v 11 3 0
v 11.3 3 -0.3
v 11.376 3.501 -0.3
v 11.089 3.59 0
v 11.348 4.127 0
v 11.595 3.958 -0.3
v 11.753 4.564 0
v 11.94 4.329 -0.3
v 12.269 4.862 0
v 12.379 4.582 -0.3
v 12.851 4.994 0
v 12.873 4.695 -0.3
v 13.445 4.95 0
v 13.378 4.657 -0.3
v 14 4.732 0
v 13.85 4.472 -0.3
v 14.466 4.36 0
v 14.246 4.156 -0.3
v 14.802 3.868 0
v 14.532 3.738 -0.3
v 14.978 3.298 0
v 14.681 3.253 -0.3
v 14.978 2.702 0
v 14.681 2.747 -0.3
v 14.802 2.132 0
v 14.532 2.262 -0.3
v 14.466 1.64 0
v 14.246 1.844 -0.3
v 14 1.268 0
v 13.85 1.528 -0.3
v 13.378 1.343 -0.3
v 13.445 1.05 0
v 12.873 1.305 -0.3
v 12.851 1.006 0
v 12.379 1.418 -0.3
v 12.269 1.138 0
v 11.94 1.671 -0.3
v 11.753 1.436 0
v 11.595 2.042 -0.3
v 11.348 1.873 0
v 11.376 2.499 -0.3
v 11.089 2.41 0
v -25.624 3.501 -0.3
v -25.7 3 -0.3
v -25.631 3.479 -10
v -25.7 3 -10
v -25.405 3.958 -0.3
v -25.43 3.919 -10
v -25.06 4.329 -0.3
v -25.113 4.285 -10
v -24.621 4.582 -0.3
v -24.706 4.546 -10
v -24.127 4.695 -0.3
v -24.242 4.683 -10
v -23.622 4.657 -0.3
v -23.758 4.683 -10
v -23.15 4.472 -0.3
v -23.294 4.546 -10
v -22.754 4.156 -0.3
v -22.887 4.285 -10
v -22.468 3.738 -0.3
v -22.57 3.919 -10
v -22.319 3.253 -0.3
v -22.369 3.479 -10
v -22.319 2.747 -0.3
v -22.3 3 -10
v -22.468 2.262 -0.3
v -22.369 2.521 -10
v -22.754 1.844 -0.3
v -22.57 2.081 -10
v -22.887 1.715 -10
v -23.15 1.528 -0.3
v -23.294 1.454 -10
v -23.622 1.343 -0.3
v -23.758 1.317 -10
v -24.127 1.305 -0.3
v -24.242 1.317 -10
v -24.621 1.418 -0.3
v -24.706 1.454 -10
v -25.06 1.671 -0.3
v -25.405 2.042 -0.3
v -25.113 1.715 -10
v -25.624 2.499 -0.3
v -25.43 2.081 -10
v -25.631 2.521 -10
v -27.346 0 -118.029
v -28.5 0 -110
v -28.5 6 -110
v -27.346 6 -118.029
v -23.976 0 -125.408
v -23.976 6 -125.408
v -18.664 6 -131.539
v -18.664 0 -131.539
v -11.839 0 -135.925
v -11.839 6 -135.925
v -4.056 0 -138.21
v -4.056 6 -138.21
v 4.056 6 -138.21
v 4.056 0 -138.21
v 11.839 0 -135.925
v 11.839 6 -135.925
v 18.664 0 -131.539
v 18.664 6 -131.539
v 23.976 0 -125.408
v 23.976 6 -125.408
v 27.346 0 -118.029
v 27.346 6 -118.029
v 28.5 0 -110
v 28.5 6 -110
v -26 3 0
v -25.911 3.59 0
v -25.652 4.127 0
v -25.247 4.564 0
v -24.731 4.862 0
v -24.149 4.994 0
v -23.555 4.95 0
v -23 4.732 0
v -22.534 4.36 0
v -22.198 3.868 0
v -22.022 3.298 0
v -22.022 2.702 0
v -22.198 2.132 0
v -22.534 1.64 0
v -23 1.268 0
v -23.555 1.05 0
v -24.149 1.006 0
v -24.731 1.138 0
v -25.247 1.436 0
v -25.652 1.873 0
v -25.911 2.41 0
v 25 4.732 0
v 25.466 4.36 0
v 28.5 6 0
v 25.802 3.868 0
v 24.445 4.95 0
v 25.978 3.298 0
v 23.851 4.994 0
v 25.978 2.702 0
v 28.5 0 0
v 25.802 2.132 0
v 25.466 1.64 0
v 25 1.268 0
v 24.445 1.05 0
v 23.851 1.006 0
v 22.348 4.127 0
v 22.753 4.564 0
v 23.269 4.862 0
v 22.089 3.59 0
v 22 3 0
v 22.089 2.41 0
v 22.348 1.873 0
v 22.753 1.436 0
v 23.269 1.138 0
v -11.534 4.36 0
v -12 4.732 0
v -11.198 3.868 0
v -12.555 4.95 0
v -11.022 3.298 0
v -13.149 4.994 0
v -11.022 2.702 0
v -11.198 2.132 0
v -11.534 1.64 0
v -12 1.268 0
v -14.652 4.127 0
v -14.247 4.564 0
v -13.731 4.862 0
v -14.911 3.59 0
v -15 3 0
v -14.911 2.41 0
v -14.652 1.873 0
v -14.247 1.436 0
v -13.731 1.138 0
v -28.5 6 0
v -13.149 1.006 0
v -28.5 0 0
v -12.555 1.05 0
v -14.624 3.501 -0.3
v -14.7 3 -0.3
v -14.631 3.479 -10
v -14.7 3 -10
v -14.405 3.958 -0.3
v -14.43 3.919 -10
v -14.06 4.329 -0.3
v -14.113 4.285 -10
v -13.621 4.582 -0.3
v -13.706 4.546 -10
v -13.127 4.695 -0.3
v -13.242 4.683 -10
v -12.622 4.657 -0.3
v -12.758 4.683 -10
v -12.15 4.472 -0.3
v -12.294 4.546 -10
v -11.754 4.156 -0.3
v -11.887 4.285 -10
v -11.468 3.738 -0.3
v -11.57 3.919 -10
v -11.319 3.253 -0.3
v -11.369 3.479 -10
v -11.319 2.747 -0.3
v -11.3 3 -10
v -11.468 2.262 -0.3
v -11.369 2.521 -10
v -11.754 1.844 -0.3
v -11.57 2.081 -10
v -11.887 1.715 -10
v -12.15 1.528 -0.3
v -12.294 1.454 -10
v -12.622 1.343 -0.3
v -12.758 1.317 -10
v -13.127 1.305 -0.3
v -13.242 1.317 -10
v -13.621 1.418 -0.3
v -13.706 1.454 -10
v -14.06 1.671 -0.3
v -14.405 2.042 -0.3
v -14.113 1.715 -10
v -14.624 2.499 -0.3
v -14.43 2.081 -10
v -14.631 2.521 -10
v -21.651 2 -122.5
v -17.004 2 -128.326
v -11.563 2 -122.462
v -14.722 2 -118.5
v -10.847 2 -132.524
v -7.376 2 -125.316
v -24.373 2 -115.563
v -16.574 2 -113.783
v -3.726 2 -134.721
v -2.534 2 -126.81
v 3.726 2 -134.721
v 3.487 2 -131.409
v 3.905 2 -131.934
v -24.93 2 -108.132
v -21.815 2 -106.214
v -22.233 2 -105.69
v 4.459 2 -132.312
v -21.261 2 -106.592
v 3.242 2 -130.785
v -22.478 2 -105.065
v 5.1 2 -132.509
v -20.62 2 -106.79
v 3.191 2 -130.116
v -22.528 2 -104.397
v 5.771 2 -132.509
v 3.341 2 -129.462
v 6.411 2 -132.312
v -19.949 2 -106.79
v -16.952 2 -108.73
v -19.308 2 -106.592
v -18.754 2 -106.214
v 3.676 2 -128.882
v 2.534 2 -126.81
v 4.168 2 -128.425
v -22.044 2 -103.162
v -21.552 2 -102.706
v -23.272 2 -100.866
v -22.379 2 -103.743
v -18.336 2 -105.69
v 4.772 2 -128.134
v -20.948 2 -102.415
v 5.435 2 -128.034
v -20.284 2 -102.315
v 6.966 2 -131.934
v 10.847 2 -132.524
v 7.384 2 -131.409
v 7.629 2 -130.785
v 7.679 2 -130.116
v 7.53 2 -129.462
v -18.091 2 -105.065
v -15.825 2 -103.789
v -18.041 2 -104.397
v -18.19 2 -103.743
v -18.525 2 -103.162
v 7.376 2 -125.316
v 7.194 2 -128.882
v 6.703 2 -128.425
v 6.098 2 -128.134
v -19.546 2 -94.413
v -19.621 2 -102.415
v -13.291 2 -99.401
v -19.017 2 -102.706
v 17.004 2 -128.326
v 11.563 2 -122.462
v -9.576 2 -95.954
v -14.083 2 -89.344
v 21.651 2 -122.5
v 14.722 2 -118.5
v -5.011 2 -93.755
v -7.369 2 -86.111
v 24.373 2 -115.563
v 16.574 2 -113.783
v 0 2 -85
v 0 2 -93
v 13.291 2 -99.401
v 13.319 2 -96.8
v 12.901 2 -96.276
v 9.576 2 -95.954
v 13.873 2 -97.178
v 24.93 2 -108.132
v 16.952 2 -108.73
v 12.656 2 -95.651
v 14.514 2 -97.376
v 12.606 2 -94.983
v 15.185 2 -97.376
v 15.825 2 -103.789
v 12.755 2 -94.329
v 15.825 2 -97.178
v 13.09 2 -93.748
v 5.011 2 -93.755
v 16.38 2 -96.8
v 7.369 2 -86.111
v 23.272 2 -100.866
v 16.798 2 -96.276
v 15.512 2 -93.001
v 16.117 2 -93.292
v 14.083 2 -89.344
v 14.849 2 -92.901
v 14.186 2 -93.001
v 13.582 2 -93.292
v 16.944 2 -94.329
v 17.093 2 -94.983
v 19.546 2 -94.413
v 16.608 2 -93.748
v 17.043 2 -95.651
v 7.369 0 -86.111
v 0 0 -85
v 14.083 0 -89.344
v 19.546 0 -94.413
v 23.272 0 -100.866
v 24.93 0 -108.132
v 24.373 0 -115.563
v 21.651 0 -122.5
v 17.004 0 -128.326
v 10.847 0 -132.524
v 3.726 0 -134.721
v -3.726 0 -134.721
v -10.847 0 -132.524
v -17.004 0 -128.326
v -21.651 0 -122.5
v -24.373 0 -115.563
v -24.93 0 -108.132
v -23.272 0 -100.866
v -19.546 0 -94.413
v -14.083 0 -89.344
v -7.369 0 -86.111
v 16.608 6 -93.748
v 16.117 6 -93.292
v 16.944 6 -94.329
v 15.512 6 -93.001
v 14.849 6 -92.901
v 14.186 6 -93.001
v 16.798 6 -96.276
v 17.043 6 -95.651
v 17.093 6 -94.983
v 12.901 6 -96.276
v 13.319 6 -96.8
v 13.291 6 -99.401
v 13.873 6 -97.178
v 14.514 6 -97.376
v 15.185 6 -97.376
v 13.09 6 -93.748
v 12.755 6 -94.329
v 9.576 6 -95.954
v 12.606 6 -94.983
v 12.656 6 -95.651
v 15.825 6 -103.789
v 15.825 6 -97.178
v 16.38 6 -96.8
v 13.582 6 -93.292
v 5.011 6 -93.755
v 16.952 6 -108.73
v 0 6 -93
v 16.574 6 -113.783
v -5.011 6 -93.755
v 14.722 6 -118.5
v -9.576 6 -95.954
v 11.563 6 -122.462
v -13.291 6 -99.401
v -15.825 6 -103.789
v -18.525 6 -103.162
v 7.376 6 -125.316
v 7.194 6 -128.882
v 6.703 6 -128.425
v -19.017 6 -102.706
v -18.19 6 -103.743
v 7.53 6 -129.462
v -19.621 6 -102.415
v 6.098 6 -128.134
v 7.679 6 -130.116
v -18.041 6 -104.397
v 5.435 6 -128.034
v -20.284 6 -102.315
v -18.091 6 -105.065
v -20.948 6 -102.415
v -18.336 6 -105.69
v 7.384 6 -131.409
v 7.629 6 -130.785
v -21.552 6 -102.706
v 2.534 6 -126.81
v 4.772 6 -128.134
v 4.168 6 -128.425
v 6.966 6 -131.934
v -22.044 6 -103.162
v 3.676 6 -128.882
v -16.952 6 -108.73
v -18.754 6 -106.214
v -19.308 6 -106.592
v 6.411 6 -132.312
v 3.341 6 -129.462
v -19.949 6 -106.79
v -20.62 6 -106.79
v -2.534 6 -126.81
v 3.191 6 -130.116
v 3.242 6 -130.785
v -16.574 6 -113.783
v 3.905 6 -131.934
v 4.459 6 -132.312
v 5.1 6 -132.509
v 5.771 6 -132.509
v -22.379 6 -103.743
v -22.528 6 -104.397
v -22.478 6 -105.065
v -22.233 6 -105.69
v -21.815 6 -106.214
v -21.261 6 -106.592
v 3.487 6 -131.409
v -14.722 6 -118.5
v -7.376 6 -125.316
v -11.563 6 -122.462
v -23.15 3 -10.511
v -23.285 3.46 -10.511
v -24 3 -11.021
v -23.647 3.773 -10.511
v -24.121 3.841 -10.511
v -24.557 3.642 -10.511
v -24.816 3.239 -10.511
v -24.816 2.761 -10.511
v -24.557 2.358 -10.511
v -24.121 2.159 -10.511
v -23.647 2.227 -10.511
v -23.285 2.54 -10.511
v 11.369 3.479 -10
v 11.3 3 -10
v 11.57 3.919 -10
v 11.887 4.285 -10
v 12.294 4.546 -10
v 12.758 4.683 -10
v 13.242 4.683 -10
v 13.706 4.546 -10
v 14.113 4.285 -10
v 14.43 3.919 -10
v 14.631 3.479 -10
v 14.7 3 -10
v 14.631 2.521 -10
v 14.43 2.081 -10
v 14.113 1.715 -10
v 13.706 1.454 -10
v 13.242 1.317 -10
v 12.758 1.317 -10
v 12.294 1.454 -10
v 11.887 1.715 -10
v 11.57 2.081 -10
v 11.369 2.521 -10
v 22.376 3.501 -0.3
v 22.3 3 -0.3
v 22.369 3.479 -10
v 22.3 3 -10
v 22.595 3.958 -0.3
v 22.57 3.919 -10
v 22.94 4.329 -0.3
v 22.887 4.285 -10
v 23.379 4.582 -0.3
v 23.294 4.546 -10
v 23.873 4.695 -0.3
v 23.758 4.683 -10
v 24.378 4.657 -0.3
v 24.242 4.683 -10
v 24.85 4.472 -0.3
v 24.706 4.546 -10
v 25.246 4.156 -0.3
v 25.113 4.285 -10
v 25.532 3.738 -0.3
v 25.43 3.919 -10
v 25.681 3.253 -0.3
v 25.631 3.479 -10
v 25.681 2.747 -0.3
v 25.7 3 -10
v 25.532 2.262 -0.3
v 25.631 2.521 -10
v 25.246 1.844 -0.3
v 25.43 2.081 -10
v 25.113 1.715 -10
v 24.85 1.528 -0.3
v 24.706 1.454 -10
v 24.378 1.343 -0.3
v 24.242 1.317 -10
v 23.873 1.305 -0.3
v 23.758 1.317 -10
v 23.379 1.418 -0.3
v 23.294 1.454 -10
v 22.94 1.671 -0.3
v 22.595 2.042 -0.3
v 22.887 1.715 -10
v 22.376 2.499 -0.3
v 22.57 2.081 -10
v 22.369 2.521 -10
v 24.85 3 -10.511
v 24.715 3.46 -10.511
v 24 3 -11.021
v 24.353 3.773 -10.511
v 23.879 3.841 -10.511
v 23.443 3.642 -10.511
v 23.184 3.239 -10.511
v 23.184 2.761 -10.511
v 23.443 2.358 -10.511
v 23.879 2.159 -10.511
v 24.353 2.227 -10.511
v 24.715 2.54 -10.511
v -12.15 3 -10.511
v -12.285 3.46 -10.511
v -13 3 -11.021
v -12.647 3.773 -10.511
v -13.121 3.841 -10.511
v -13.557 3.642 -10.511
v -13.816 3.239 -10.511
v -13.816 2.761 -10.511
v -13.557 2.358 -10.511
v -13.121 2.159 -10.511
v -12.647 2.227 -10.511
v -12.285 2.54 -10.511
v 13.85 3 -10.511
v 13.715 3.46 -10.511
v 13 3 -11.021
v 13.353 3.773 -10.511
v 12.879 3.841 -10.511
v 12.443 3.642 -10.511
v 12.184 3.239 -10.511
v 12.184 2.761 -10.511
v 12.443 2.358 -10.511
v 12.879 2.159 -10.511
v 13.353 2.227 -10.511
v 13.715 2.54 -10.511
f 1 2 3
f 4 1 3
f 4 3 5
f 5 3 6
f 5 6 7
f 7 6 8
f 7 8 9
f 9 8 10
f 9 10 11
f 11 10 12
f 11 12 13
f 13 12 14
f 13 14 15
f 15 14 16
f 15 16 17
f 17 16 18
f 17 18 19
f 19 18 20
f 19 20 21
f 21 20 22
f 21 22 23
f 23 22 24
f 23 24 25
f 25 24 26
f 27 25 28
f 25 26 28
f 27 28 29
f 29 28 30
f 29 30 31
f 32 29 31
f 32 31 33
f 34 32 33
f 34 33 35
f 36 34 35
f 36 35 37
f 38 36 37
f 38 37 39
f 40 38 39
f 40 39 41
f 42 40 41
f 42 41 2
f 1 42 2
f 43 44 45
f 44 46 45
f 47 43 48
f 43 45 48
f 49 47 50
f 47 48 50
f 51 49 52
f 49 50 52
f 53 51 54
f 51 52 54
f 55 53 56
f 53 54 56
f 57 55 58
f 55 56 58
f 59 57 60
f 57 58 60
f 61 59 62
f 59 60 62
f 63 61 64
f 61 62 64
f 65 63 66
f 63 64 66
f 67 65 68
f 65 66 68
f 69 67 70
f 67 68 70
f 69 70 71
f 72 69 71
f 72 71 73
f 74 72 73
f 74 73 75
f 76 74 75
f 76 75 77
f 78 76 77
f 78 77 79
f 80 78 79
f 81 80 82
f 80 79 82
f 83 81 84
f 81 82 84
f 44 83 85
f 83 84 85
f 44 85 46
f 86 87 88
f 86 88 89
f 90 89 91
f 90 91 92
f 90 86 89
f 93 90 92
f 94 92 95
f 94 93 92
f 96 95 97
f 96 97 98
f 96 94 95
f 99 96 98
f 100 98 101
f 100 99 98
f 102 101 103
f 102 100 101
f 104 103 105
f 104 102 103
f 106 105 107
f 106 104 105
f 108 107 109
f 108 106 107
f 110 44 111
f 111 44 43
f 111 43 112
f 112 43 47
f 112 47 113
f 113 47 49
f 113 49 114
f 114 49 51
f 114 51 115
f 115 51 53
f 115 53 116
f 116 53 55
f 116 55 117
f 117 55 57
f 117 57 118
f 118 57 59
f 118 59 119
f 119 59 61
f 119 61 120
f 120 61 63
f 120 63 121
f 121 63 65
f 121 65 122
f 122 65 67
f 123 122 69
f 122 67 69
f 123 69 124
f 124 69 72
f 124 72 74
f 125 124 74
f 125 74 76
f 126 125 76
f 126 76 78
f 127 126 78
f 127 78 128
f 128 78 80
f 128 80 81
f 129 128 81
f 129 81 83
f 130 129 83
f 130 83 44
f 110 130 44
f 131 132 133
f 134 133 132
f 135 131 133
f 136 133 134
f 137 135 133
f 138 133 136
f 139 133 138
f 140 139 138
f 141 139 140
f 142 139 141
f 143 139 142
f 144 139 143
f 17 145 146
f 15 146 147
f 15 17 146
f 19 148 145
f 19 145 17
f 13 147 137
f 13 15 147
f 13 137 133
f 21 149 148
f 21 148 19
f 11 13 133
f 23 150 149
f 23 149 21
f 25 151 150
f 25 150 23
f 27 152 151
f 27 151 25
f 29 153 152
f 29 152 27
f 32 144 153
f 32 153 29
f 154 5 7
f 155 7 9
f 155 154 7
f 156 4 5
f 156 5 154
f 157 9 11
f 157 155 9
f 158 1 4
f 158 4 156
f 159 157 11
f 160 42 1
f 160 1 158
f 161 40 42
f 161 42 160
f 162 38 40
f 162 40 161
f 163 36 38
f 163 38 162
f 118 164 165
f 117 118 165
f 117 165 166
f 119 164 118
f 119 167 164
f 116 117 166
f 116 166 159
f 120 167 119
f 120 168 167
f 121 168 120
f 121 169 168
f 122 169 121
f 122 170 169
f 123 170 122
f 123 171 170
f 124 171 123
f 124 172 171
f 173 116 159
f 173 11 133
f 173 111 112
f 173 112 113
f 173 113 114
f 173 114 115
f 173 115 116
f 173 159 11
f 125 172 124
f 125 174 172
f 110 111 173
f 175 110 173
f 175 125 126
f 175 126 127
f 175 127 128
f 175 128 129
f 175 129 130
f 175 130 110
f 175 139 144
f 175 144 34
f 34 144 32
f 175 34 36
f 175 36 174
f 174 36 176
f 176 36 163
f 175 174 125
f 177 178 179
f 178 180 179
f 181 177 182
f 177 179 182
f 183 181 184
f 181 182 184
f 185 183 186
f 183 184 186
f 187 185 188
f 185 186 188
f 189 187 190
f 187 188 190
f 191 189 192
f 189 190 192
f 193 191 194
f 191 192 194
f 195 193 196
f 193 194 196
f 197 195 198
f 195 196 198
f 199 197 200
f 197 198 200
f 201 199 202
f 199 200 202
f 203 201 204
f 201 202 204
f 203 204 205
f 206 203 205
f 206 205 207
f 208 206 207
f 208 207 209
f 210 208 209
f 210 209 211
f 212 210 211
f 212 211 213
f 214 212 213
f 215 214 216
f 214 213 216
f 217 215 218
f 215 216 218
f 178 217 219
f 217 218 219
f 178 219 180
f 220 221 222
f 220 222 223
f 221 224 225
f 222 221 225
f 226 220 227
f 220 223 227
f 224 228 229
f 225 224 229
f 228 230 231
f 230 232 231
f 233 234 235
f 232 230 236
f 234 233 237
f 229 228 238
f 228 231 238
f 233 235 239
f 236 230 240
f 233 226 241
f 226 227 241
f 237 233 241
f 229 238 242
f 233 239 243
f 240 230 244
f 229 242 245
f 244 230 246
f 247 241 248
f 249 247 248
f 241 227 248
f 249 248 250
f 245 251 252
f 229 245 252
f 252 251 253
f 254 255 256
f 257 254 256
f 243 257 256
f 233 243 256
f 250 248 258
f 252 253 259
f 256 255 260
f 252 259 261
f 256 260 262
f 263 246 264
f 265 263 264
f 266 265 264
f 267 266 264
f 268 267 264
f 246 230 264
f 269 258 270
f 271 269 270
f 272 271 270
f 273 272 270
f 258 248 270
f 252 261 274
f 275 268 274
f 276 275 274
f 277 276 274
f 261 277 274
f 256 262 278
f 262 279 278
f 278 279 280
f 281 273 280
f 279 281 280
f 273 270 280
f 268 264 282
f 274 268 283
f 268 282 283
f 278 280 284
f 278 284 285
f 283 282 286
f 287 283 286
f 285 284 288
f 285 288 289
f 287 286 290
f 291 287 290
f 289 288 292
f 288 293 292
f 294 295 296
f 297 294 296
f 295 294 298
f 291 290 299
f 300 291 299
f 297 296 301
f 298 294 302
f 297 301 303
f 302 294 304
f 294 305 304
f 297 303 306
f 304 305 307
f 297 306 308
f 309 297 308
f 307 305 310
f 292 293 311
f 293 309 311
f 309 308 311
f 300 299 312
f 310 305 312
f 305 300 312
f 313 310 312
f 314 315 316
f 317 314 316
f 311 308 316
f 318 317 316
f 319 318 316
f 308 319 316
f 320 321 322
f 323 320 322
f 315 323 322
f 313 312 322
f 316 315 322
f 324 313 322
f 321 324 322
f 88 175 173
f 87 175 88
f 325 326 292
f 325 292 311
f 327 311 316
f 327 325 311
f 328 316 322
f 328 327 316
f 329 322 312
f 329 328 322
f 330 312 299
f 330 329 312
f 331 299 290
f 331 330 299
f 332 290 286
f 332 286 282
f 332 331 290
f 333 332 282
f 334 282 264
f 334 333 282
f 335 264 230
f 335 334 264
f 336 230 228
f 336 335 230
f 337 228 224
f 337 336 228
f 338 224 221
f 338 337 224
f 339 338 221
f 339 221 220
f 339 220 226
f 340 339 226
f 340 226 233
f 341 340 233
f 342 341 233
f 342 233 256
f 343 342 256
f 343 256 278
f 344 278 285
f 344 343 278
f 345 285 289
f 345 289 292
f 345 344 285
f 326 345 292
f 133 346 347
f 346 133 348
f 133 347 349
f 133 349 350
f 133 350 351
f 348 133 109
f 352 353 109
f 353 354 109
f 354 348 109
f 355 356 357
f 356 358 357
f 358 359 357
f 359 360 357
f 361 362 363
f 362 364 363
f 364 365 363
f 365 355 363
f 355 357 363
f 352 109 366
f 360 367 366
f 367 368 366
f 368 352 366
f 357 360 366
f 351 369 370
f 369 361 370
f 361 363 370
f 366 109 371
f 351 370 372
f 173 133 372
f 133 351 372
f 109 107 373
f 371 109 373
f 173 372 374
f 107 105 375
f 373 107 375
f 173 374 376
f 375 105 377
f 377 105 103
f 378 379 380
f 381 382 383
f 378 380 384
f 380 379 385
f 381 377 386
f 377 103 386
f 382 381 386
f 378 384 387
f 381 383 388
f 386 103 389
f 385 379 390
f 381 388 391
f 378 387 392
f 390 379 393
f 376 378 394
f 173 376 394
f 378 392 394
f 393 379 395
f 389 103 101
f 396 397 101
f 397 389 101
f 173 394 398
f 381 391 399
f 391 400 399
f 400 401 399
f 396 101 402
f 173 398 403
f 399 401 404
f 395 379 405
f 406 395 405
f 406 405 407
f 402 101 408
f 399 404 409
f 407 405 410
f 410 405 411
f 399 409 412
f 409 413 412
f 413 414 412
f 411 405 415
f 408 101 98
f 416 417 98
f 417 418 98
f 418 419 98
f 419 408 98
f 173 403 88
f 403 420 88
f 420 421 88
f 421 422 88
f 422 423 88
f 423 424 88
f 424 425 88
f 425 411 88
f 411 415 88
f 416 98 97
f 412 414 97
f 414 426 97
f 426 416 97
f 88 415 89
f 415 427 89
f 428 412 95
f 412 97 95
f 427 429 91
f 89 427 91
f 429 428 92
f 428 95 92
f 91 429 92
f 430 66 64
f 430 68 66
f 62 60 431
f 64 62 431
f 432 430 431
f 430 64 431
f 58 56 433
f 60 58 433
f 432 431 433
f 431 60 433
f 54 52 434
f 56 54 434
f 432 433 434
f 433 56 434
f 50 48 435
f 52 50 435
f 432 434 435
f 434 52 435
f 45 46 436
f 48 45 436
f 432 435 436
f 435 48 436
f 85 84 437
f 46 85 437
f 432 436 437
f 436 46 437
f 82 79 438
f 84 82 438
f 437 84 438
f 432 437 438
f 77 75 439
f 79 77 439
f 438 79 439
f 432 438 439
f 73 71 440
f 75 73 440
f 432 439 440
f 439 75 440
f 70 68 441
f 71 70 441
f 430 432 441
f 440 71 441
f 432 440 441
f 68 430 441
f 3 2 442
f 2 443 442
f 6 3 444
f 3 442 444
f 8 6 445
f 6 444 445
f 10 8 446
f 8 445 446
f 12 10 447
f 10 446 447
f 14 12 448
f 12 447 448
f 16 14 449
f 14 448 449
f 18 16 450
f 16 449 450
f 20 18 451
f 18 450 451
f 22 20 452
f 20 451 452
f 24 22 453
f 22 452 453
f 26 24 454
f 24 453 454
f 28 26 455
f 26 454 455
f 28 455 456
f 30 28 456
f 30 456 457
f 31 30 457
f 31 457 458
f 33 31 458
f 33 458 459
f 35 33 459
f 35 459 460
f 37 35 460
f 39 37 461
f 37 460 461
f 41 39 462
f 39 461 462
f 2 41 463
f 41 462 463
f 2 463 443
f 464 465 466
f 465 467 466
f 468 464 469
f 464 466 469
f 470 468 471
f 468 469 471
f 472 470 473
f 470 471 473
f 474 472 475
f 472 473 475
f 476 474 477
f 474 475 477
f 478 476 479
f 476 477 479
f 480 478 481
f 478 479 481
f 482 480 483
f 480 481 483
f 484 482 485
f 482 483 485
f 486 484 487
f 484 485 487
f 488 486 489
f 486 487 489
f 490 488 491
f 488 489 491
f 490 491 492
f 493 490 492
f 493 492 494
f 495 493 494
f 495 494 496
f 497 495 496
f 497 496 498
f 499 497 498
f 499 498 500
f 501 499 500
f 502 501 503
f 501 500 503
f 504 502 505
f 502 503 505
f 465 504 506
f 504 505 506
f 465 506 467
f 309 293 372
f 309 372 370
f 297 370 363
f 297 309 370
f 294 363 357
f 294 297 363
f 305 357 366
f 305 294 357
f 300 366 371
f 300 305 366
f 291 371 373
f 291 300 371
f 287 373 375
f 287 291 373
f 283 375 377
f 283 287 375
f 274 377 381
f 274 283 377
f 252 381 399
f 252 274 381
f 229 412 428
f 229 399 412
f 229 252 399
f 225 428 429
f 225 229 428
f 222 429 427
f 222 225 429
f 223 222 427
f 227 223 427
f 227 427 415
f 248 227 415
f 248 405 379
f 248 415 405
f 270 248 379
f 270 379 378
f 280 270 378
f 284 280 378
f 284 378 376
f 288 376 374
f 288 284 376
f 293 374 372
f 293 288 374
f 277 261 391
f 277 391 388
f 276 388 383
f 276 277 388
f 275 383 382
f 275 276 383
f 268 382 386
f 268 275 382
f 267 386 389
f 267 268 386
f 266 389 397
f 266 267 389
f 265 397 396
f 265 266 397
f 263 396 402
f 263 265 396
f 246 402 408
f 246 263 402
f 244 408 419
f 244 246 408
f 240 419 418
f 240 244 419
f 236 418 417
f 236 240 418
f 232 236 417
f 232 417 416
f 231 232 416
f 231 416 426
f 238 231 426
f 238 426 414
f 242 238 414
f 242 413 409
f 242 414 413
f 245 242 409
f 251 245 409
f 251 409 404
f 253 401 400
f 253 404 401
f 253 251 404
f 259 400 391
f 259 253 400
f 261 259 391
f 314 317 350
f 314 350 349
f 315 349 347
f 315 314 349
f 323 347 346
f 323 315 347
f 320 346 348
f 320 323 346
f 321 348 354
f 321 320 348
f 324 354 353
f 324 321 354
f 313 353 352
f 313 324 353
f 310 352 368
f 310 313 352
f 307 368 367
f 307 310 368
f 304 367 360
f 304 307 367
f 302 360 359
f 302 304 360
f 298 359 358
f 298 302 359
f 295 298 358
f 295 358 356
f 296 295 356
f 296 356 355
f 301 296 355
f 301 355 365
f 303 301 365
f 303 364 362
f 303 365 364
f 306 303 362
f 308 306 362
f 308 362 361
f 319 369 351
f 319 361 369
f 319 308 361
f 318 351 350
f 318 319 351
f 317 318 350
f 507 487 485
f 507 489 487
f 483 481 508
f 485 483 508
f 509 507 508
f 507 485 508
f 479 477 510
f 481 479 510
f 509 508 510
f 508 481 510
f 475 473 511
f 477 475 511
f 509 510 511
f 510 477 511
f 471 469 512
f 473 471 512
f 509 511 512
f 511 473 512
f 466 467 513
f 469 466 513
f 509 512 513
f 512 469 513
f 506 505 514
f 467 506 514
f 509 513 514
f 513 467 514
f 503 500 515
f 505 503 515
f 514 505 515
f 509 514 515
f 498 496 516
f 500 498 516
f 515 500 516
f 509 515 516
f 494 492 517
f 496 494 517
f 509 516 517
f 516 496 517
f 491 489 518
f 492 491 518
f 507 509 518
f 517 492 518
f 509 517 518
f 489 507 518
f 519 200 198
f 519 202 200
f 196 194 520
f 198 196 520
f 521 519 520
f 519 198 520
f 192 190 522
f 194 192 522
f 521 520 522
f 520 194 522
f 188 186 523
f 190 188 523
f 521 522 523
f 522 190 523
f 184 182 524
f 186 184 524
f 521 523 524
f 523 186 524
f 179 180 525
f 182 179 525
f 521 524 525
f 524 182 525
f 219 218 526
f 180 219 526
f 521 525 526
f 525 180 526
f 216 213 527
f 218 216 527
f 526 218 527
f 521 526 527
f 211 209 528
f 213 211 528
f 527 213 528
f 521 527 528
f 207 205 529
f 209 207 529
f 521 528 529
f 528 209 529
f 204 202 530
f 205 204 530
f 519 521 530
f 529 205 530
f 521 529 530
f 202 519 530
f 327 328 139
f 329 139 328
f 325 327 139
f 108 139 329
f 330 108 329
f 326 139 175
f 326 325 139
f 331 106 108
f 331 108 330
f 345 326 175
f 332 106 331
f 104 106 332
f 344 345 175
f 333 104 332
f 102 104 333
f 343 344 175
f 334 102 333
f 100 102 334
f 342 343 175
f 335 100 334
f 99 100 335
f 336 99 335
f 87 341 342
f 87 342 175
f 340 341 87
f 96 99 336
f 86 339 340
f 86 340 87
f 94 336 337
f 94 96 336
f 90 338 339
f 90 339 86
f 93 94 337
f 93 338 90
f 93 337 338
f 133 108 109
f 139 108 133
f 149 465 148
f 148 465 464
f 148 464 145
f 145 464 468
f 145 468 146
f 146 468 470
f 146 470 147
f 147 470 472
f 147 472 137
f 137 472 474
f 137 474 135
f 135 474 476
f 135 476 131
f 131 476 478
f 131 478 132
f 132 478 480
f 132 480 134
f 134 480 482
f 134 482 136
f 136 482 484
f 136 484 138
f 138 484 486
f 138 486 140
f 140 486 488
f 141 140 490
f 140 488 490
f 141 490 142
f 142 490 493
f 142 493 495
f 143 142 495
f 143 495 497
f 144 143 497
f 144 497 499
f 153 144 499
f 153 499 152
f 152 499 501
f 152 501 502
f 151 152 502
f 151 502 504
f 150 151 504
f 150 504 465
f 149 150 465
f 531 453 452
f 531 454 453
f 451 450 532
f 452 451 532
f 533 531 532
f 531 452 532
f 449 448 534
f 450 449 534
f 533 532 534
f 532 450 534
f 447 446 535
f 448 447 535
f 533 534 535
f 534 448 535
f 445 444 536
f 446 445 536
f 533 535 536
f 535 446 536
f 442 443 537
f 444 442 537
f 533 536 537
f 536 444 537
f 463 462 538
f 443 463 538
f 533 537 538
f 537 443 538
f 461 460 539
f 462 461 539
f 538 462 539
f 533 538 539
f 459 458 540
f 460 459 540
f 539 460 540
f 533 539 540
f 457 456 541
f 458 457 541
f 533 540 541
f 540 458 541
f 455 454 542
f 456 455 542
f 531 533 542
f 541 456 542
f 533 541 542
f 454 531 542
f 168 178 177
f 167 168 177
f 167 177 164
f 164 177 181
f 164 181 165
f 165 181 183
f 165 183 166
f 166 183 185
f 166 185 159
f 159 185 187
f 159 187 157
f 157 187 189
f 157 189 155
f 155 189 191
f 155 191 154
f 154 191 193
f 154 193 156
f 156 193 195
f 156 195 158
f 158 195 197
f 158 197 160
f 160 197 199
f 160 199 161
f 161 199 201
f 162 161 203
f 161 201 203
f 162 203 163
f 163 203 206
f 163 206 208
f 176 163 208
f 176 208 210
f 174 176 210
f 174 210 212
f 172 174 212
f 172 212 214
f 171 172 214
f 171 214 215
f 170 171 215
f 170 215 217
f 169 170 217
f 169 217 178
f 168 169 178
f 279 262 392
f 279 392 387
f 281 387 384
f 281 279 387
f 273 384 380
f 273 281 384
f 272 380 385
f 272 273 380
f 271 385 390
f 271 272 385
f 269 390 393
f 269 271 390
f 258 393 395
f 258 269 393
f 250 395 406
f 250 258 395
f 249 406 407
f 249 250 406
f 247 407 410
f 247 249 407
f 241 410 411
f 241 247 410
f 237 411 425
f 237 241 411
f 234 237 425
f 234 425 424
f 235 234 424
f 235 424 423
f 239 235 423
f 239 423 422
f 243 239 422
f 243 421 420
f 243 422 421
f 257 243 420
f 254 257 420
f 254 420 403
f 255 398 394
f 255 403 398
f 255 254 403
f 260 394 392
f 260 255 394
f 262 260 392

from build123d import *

# Parameters (mm, degrees)
AUFSATZ_LINEAR_AUSTRAGEN1_DEPTH                      = 6
SKIZZE1_4_R                                          = 25
SCHNITT_LINEAR_AUSTRAGEN1_DEPTH                      = 2
SKIZZE1_5_R                                          = 17
SCHNITT_LINEAR_AUSTRAGEN2_DEPTH                      = 142.529148941
SKIZZE1_6_R                                          = 2.25
SCHNITT_LINEAR_AUSTRAGEN3_DEPTH                      = 142.529148941
CSK_FOR_M3_RAISED_COUNTERSUNK_HEAD_SCREW_D           = 3.4
CSK_FOR_M3_RAISED_COUNTERSUNK_HEAD_SCREW_DEPTH       = 10
CSK_FOR_M3_RAISED_COUNTERSUNK_HEAD_SCREW_CSINK_D     = 4
CSK_FOR_M3_RAISED_COUNTERSUNK_HEAD_SCREW_CSINK_ANGLE = 90
CSK_FOR_M3_RAISED_COUNTERSUNK_HEAD_SCREW_TIP         = 1.021463052


with BuildPart() as part:
    # Skizze1 → Aufsatz-Linear austragen1 (new body)
    with BuildSketch(Plane(origin=(0, 0, 0), x_dir=(1, 0, 0), z_dir=(0, 1, 0))):
        with BuildLine():
            Line((0, 0), (-28.5, 0))
            Line((-28.5, 0), (-28.5, 110))
            ThreePointArc((-28.5, 110), (0, 138.5), (28.5, 110))
            Line((28.5, 110), (28.5, 0))
            Line((28.5, 0), (0, 0))
        make_face()
    extrude(amount=AUFSATZ_LINEAR_AUSTRAGEN1_DEPTH)

    # Skizze1<4> → Schnitt-Linear austragen1 (cut)
    with BuildSketch(Plane(origin=(0, 0, 0), x_dir=(1, 0, 0), z_dir=(0, 1, 0))):
        with Locations((0, 110)):
            Circle(SKIZZE1_4_R)
    extrude(amount=SCHNITT_LINEAR_AUSTRAGEN1_DEPTH, mode=Mode.SUBTRACT)

    # Skizze1<5> → Schnitt-Linear austragen2 (cut, through all)
    with BuildSketch(Plane(origin=(0, 0, 0), x_dir=(1, 0, 0), z_dir=(0, 1, 0))):
        with Locations((0, 110)):
            Circle(SKIZZE1_5_R)
    extrude(amount=SCHNITT_LINEAR_AUSTRAGEN2_DEPTH, mode=Mode.SUBTRACT)

    # Skizze1<6> → Schnitt-Linear austragen3 (cut, through all)
    with BuildSketch(Plane(origin=(0, 0, 0), x_dir=(1, 0, 0), z_dir=(0, 1, 0))):
        with Locations((14.849242405, 95.150757595)):
            Circle(SKIZZE1_6_R)
        with Locations((5.435199947, 130.284442352)):
            Circle(SKIZZE1_6_R)
        with Locations((-20.284442352, 104.564800053)):
            Circle(SKIZZE1_6_R)
    extrude(amount=SCHNITT_LINEAR_AUSTRAGEN3_DEPTH, mode=Mode.SUBTRACT)

    # CSK for M3 Raised Countersunk Head Screw 174741
    with Locations(Plane(origin=(-24, 3, 0), x_dir=(1, 0, 0), z_dir=(0, 0, 1))):
        with Locations((0, 0), (11, 0), (37, 0), (48, 0)):
            CounterSinkHole(CSK_FOR_M3_RAISED_COUNTERSUNK_HEAD_SCREW_D / 2, CSK_FOR_M3_RAISED_COUNTERSUNK_HEAD_SCREW_CSINK_D / 2, depth=CSK_FOR_M3_RAISED_COUNTERSUNK_HEAD_SCREW_DEPTH, counter_sink_angle=CSK_FOR_M3_RAISED_COUNTERSUNK_HEAD_SCREW_CSINK_ANGLE)
            with Locations((0, 0, -(CSK_FOR_M3_RAISED_COUNTERSUNK_HEAD_SCREW_DEPTH + CSK_FOR_M3_RAISED_COUNTERSUNK_HEAD_SCREW_TIP / 2))):  # 118° drill point
                Cone(0, CSK_FOR_M3_RAISED_COUNTERSUNK_HEAD_SCREW_D / 2, CSK_FOR_M3_RAISED_COUNTERSUNK_HEAD_SCREW_TIP, mode=Mode.SUBTRACT)


solid = part.part
